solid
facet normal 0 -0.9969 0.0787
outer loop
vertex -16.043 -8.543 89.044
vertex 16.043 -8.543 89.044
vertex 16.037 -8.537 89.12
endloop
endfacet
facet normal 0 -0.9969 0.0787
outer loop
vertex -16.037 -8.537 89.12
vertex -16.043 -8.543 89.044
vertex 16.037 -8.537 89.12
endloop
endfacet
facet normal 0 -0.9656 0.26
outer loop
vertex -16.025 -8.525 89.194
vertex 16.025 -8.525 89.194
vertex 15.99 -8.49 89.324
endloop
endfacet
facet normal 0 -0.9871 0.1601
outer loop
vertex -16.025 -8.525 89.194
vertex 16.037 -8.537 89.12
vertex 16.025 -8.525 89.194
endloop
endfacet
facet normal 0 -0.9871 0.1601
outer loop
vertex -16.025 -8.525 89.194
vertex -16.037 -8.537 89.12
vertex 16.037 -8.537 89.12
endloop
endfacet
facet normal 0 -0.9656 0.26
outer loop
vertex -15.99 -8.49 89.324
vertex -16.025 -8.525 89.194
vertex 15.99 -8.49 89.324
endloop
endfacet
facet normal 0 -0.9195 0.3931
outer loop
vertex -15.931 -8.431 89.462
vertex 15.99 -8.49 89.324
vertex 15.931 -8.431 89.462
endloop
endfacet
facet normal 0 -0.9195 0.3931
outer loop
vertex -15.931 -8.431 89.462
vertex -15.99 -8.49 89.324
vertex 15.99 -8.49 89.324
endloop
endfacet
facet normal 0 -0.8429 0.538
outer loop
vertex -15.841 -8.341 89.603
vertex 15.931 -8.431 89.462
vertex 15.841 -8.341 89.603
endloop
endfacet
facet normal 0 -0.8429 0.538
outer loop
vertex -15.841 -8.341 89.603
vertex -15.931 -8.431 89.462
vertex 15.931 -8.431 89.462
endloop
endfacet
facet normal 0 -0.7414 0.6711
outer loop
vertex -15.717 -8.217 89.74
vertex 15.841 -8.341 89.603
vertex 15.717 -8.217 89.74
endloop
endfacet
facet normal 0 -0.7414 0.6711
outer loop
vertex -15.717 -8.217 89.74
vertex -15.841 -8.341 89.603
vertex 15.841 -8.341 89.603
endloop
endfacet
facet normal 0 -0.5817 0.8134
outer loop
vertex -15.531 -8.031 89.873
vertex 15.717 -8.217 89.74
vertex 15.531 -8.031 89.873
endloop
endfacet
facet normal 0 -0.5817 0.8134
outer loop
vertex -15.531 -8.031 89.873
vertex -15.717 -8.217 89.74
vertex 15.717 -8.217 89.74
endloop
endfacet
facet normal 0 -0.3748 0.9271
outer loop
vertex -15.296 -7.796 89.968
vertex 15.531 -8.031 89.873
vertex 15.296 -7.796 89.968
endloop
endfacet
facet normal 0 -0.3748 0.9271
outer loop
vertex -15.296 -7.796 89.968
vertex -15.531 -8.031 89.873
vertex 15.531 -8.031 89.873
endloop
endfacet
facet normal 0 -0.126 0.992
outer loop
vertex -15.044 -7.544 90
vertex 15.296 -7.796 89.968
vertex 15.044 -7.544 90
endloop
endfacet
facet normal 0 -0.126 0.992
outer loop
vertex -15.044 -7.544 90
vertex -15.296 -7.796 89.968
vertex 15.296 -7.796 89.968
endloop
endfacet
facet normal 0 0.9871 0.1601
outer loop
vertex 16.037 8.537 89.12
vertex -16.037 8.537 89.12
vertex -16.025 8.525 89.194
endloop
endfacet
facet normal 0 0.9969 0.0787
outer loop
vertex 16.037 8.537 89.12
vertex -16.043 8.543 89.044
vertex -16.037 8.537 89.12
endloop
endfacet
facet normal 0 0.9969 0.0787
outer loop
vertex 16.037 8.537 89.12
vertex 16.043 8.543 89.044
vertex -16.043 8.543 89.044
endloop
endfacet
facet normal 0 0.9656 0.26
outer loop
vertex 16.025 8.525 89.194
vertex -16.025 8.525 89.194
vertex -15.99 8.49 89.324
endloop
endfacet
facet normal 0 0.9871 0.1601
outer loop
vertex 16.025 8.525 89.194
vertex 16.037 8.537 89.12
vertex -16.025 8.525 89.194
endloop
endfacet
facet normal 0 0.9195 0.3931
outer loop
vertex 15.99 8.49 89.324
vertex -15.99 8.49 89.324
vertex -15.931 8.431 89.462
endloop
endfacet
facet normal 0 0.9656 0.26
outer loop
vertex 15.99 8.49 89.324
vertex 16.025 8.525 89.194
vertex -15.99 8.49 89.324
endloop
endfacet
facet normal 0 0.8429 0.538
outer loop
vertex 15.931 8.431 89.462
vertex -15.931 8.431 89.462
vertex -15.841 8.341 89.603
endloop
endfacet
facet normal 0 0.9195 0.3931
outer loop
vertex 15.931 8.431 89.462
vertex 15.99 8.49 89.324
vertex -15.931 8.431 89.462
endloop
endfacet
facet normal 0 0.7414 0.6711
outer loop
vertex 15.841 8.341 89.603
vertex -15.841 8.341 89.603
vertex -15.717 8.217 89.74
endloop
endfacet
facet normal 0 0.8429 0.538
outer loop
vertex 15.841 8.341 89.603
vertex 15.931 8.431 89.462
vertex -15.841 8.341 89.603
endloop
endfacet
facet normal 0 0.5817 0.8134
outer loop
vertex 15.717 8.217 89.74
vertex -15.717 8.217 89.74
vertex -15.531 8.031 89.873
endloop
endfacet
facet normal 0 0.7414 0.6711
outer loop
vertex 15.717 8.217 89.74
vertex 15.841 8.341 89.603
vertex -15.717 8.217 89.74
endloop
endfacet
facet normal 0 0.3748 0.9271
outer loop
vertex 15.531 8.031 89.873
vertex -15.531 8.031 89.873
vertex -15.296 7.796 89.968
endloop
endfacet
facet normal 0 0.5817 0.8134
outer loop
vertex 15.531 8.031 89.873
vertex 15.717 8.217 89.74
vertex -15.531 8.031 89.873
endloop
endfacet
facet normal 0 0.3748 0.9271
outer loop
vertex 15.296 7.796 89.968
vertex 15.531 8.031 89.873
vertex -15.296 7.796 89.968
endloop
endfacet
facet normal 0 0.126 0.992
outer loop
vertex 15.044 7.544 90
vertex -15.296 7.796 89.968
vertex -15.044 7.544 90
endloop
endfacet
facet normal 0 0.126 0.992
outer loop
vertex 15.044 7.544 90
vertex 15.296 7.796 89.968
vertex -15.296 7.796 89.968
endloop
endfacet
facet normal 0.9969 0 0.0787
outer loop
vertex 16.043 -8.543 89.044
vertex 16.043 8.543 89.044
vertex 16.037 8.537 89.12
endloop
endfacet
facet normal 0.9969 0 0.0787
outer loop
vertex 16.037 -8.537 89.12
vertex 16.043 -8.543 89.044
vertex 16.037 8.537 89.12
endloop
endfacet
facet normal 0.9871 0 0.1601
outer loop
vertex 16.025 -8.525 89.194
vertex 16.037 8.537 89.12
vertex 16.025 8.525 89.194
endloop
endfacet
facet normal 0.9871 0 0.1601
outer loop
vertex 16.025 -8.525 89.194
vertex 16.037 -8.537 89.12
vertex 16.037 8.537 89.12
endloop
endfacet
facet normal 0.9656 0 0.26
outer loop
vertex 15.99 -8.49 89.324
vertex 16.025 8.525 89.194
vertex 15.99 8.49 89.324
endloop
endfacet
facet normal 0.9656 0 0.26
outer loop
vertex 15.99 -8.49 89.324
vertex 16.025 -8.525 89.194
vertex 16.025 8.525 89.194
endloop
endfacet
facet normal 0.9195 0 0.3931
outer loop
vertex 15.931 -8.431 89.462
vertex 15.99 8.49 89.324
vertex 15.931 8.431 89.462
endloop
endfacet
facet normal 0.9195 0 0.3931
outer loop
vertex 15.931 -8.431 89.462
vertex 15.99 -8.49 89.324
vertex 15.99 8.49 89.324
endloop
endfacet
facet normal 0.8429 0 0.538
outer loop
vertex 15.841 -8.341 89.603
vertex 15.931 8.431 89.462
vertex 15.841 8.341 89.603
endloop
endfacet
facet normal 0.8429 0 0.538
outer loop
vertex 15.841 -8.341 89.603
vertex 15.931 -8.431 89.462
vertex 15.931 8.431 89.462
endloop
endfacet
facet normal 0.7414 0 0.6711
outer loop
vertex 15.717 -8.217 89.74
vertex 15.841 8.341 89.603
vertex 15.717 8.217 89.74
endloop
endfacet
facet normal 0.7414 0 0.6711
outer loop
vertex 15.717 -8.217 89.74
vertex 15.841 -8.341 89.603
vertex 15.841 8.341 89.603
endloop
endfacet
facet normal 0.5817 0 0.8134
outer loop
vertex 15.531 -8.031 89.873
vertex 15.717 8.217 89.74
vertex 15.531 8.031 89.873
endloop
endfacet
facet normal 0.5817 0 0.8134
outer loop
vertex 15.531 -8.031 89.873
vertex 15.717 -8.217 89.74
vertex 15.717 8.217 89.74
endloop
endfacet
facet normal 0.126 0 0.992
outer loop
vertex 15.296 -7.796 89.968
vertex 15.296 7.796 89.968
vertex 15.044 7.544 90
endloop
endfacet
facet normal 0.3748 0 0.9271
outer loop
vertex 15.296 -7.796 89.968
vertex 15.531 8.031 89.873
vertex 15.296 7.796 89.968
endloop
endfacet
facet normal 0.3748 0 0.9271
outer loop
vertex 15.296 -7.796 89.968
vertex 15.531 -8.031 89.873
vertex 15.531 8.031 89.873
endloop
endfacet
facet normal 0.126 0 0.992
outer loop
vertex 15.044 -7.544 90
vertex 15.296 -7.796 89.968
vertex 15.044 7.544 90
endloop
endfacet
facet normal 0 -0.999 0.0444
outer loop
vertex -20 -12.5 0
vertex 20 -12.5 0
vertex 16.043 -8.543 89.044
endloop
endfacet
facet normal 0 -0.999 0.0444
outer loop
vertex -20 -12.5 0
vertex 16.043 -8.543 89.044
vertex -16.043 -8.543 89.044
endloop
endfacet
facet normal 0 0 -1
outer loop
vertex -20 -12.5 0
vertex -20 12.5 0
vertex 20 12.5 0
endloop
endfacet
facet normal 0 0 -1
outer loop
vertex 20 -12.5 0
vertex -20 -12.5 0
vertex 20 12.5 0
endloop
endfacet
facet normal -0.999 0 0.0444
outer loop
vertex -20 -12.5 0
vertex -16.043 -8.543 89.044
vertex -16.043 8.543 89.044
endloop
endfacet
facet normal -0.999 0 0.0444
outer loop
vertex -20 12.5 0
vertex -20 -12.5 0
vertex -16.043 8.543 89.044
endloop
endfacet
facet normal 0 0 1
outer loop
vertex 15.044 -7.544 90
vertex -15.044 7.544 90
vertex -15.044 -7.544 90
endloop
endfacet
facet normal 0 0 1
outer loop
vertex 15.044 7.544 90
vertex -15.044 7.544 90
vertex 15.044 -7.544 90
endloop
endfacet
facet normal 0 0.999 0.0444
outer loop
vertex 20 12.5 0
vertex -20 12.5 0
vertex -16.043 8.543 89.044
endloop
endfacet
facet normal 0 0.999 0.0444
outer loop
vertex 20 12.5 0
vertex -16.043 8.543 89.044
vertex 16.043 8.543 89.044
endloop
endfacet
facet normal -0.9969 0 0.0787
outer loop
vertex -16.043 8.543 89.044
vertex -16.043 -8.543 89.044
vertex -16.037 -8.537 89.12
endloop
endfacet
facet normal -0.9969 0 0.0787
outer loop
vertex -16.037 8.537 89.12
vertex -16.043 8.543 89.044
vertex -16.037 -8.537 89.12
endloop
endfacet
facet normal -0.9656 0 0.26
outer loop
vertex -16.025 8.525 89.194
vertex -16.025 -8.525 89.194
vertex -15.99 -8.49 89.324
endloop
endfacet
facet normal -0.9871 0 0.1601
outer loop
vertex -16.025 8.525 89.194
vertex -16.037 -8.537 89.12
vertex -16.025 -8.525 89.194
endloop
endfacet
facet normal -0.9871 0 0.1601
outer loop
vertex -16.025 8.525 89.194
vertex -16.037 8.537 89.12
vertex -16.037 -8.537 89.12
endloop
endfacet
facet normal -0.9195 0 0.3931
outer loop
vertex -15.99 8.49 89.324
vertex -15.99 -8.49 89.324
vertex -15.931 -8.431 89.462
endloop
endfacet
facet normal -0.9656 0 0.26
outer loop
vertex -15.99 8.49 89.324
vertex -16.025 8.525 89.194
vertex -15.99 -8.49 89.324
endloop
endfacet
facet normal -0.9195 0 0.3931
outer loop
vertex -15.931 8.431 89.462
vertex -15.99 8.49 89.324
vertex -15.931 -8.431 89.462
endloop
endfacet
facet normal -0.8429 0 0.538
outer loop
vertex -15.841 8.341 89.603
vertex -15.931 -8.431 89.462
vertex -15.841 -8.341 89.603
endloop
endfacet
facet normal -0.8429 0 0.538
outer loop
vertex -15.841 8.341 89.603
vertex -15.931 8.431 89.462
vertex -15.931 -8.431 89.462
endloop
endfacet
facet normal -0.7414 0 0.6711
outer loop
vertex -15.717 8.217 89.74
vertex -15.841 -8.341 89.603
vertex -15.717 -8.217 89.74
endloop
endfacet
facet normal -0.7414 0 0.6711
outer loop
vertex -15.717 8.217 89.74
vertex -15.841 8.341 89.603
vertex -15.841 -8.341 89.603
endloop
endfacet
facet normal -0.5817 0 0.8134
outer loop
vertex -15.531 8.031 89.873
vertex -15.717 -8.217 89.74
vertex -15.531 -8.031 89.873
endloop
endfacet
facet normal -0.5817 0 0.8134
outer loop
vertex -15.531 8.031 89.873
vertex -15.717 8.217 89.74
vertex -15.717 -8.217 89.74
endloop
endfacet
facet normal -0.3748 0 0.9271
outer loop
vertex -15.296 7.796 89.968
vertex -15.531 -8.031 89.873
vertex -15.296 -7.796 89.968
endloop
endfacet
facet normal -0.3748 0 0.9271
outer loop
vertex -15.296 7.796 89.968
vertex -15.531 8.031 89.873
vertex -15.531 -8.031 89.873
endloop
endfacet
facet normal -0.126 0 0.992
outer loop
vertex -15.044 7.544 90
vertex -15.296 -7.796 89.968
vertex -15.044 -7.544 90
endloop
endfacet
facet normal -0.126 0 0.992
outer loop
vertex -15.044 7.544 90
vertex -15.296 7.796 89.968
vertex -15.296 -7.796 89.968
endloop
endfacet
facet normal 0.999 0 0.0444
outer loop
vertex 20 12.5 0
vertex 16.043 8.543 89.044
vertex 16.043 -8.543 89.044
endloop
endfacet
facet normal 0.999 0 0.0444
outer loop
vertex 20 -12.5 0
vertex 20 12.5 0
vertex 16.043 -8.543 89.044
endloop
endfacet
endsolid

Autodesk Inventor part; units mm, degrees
ref_plane "YZ Plane" through (0, 0, 0) normal (1, 0, 0) x (0, 1, 0)
ref_plane "XZ Plane" through (0, 0, 0) normal (0, 1, 0) x (-1, 0, 0)
ref_plane "XY Plane" through (0, 0, 0) normal (0, 0, 1) x (1, 0, 0)
sketch "Sketch1" plane through (0, 0, 0) normal (0, 0, 1) x (1, 0, 0)
  line L0 (-20, 12.5) -> (20, 12.5)
  line L1 (20, 12.5) -> (20, -12.5)
  line L2 (20, -12.5) -> (-20, -12.5)
  line L3 (-20, -12.5) -> (-20, 12.5)
  point P0 (0, 0)
  dimension "d0" = 40
  dimension "d1" = 25
  dimension "d2" = 12.5
  dimension "d3" = 20
extrude "Extrusion1" add sketch "Sketch1" along normal blind 90
chamfer "Chamfer1" distance 4 distance2 90 1 edges at (0, 12.5, 90) measured on face at (-6.6667, 4.1667, 90)
chamfer "Chamfer2" distance 4 distance2 90 1 edges at (0, -12.5, 90) measured on face at (-6.6667, 1.5003, 90)
chamfer "Chamfer3" distance 4 distance2 90 1 edges at (20, 0, 90) measured on face at (-6.6667, 2.8335, 90)
chamfer "Chamfer4" distance 4 distance2 90 1 edges at (-20, 0, 90) measured on face at (-7.9998, 2.8335, 90)
fillet "Fillet1" radius 1 4 edges at (0, 8.5005, 90) (-16.0005, 0, 90) (0, -8.5005, 90) (16.0005, 0, 90)
properties part number "Foot"
